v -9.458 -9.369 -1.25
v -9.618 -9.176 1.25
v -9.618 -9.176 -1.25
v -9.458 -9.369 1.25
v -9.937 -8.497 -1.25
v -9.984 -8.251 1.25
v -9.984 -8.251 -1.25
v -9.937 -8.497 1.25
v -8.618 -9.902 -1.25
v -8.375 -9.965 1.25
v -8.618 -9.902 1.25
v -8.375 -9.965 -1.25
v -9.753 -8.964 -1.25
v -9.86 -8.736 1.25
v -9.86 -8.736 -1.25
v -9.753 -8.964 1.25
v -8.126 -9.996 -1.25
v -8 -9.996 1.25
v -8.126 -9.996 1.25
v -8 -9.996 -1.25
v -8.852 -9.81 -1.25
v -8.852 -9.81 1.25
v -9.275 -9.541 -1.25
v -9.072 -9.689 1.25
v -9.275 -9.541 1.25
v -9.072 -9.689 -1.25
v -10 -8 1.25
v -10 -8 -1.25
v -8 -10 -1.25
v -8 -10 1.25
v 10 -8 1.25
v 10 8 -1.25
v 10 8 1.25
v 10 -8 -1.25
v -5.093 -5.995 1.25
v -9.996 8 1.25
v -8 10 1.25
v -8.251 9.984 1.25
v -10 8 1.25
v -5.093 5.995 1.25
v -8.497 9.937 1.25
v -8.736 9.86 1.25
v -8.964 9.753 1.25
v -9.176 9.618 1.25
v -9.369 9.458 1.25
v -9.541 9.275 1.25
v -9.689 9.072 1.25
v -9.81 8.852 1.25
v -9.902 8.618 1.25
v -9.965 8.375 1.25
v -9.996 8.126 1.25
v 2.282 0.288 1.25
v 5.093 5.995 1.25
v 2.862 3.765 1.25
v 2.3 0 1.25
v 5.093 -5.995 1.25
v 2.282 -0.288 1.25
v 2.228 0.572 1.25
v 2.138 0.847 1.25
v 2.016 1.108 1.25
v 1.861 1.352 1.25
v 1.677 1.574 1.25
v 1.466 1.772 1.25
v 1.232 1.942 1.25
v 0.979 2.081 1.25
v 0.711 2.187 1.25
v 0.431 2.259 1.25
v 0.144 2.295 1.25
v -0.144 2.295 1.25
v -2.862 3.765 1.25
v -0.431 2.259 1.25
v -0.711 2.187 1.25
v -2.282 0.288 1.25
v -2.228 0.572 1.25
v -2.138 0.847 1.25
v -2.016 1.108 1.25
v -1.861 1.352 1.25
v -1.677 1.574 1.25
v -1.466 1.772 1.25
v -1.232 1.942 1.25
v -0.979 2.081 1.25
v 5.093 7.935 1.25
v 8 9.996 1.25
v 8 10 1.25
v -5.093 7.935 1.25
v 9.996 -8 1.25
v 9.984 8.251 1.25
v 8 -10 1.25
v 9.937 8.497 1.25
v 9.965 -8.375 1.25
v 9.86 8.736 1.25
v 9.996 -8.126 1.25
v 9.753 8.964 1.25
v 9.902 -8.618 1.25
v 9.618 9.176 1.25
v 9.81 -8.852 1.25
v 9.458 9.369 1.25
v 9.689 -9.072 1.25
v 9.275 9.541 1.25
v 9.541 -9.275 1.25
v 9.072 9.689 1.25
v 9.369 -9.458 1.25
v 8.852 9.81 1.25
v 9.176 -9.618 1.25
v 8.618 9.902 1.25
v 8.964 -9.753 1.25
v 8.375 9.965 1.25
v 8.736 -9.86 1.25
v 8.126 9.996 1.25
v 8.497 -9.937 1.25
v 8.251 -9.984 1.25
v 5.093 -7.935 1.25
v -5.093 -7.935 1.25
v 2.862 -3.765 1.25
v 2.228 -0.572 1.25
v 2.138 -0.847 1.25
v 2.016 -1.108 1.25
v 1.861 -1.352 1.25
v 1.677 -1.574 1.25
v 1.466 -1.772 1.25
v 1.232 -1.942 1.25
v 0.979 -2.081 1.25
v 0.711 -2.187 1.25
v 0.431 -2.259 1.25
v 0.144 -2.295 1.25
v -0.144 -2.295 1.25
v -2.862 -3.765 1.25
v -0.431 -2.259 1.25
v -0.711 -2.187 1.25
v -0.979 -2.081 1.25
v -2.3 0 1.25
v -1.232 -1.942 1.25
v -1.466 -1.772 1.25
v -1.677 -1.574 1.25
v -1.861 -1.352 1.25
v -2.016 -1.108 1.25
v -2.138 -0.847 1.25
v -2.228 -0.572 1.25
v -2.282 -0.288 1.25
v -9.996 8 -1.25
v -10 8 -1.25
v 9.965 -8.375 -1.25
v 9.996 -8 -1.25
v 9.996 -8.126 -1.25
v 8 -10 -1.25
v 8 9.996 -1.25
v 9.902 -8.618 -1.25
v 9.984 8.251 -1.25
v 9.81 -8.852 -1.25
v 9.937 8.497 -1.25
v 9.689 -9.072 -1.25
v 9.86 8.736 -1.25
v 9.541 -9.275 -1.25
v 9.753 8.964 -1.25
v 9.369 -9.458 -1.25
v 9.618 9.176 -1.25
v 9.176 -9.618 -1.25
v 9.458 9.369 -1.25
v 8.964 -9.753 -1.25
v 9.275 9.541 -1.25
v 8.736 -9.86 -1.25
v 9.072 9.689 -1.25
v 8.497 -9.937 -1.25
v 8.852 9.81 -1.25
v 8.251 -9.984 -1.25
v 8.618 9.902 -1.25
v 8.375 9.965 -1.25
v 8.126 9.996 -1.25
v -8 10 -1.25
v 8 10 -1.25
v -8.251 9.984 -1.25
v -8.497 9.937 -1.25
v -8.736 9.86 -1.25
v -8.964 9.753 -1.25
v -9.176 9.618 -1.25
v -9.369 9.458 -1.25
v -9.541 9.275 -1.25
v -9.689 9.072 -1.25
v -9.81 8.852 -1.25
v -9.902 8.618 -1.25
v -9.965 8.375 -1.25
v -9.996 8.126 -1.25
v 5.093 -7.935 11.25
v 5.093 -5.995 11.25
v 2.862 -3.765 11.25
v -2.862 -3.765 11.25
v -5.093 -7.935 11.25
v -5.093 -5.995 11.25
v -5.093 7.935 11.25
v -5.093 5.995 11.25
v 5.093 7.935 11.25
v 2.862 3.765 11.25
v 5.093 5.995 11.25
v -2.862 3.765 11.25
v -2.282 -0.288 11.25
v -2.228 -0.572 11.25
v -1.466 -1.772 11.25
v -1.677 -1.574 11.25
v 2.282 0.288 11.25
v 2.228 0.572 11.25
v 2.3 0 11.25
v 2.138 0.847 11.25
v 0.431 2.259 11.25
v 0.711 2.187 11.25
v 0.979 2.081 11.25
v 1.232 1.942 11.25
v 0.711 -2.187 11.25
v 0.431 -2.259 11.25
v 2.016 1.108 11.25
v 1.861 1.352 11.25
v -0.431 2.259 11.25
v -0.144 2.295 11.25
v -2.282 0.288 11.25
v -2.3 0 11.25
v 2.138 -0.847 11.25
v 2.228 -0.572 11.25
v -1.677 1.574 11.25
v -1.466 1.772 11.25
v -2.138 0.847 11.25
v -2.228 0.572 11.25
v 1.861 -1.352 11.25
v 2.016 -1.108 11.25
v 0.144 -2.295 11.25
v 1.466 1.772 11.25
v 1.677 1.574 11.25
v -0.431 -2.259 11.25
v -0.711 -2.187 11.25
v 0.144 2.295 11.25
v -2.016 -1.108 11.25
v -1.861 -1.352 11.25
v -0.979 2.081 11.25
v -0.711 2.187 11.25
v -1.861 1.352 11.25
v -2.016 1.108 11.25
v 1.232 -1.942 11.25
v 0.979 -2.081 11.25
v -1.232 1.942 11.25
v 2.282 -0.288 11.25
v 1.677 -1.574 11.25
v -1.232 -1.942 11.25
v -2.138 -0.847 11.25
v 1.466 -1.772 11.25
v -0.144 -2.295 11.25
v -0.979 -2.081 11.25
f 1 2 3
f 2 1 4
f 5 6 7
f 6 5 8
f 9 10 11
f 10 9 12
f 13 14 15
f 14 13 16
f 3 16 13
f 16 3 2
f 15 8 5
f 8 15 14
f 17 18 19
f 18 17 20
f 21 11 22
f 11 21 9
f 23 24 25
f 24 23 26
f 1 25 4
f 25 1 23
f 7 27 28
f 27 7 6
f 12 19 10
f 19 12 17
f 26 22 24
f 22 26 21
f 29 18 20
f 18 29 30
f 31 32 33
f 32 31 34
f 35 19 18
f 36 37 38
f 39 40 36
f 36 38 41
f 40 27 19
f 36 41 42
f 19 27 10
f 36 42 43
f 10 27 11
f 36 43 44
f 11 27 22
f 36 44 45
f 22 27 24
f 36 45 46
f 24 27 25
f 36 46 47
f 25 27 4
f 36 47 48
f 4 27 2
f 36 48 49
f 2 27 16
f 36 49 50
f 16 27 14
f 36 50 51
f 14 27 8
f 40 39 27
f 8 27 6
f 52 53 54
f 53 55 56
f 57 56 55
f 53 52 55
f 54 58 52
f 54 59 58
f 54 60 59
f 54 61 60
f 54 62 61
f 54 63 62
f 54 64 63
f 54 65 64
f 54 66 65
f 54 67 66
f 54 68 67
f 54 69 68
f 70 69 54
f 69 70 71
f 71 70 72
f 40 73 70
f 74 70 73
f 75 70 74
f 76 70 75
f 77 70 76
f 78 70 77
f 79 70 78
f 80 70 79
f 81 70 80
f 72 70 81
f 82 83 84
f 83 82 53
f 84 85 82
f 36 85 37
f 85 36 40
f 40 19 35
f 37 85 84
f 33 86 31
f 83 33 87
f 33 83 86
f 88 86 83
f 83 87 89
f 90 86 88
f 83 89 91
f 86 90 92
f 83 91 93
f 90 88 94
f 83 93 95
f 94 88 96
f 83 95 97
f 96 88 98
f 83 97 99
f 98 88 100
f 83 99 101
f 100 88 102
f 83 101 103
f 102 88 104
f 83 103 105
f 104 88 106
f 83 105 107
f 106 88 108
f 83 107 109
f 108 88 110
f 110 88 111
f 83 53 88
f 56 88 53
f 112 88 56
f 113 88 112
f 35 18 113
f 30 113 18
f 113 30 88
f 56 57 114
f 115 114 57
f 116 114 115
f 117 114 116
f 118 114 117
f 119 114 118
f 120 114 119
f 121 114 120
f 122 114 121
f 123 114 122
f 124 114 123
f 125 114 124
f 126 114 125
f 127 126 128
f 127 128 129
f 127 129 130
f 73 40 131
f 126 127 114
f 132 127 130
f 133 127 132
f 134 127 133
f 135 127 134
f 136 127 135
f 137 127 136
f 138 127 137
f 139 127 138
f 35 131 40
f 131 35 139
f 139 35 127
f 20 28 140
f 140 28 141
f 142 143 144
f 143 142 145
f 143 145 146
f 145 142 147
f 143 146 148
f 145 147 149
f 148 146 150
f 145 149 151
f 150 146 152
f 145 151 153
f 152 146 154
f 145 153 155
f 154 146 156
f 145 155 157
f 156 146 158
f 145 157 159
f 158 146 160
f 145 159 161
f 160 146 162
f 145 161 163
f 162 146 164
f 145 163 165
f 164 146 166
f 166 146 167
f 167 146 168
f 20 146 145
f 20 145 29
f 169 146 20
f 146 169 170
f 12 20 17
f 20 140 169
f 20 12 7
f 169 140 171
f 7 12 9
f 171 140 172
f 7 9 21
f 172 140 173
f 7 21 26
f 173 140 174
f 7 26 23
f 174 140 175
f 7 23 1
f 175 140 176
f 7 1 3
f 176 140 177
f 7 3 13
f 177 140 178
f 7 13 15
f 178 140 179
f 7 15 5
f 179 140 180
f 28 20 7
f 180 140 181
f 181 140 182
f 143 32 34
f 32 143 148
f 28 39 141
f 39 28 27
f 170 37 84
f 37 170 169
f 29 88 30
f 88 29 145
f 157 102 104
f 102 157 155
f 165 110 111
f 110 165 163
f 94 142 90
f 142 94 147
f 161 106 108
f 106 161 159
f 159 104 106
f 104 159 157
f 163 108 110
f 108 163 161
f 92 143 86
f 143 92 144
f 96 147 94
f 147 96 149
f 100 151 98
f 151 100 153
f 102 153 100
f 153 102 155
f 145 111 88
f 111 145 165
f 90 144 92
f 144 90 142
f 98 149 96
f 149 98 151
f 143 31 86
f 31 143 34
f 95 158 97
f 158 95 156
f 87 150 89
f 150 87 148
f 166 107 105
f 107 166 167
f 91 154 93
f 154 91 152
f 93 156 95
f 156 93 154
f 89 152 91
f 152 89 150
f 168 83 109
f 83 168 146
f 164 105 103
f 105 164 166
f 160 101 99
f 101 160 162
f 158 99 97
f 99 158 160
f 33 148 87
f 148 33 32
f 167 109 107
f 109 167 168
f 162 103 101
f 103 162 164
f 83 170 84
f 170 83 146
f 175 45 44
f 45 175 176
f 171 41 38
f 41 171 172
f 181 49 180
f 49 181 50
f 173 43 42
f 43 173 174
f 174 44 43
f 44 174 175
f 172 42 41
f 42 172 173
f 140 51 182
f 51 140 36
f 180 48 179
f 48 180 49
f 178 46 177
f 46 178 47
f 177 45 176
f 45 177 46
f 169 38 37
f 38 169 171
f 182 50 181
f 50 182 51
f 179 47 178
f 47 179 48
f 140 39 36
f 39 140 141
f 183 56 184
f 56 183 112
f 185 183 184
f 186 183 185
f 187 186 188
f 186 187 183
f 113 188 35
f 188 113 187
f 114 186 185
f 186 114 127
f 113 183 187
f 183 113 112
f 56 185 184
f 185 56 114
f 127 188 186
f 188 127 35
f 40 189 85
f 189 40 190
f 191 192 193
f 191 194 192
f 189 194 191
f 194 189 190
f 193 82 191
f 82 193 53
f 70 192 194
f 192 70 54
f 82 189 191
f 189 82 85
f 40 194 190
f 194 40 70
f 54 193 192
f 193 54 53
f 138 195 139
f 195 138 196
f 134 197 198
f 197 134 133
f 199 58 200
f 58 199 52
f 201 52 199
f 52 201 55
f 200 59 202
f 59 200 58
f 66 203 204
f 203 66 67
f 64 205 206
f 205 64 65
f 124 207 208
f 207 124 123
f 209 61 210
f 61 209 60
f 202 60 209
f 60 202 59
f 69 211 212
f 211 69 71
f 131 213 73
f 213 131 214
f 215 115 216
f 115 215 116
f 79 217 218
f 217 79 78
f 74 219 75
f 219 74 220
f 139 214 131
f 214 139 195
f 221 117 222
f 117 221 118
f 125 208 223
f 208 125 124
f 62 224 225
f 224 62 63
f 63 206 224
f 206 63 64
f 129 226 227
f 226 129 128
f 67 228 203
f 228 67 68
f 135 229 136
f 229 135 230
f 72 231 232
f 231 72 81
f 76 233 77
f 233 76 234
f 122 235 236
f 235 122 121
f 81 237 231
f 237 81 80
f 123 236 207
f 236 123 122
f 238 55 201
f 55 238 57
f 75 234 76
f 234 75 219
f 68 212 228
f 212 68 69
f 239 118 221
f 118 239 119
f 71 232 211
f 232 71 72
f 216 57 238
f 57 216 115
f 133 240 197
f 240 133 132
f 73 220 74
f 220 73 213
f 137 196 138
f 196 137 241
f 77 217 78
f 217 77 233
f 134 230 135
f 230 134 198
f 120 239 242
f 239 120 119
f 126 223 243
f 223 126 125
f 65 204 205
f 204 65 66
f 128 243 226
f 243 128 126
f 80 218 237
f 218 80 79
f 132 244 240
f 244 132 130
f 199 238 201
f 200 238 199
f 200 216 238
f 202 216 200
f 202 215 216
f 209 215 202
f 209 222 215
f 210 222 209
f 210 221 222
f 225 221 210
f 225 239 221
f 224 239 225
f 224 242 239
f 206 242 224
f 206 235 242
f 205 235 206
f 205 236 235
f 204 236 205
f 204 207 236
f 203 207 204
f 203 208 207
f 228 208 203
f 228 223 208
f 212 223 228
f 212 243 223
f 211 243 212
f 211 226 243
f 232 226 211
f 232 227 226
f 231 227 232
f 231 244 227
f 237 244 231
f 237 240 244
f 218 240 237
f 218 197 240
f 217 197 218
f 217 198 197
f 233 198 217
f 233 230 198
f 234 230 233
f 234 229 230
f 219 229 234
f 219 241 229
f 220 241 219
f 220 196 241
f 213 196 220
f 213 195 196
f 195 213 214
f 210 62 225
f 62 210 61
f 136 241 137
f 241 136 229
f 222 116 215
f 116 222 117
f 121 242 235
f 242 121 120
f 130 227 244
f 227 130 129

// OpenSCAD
$fn=50;

snugness_factor=0.97;

makefeet();

module makefeet()
{
  union()
  {
    translate([0,0,0]) roundedbox(20,20,2.5,2);
    translate([0,0,(11/2)+1.25-1]) cylinder(11,4.6/2,4.6/2,center=true); // Rod for central 5mm dia hole
    translate([0,-(10-4.15),((11/2)+1.25)-1]) rotate([0,0,0]) makesideinsert(10);
    translate([0,10-4.15,((11/2)+1.25)-1]) rotate([0,0,180]) makesideinsert(10);
  }
}

module makesideinsert(len)
{
  scale([snugness_factor,snugness_factor,1])
  {
    difference()
    {
      cube([10.5,4.3,len+1],center=true);
      translate([(10.5/2)+((4/1.414)/2),(4.3/2)+((4/1.414)/2)-2.3,0]) rotate([0,0,45]) cube([4,10,len+2],center=true);
      translate([-((10.5/2)+((4/1.414)/2)),(4.3/2)+((4/1.414)/2)-2.3,0]) rotate([0,0,-45]) cube([4,10,len+2],center=true);
    }
  }
}

module roundedbox(l,d,h,r)
{
  difference()
  {
    difference()
    {
      difference()
      {
        difference()
        {
          cube([l,d,h],center=true);
          translate([-(l/2)+r,-(d/2)+r,0]){corner(r,h,0);};
        }
        translate([(l/2)-r,-(d/2)+r,0]){corner(r,h,90);};
      }
      translate([(l/2)-r,(d/2)-r,0]){corner(r,h,180);};
    }
    translate([-(l/2)+r,(d/2)-r,0]){corner(r,h,270);};
  }
}

module corner(r,h,ang)
{
  rotate([0,0,ang])
  {
    difference()
    {
      difference()
      {
        difference()
        {
          cylinder(h*2,r*2,r*2,center=true);
          cylinder(h*2,r,r,center=true);
        }
        translate([r*5,0,0]){cube([r*10,r*10,h*2],center=true);}
      }
      translate([0,r*5,0]){cube([r*10,r*10,h*2],center=true);}
    }
  }
}
